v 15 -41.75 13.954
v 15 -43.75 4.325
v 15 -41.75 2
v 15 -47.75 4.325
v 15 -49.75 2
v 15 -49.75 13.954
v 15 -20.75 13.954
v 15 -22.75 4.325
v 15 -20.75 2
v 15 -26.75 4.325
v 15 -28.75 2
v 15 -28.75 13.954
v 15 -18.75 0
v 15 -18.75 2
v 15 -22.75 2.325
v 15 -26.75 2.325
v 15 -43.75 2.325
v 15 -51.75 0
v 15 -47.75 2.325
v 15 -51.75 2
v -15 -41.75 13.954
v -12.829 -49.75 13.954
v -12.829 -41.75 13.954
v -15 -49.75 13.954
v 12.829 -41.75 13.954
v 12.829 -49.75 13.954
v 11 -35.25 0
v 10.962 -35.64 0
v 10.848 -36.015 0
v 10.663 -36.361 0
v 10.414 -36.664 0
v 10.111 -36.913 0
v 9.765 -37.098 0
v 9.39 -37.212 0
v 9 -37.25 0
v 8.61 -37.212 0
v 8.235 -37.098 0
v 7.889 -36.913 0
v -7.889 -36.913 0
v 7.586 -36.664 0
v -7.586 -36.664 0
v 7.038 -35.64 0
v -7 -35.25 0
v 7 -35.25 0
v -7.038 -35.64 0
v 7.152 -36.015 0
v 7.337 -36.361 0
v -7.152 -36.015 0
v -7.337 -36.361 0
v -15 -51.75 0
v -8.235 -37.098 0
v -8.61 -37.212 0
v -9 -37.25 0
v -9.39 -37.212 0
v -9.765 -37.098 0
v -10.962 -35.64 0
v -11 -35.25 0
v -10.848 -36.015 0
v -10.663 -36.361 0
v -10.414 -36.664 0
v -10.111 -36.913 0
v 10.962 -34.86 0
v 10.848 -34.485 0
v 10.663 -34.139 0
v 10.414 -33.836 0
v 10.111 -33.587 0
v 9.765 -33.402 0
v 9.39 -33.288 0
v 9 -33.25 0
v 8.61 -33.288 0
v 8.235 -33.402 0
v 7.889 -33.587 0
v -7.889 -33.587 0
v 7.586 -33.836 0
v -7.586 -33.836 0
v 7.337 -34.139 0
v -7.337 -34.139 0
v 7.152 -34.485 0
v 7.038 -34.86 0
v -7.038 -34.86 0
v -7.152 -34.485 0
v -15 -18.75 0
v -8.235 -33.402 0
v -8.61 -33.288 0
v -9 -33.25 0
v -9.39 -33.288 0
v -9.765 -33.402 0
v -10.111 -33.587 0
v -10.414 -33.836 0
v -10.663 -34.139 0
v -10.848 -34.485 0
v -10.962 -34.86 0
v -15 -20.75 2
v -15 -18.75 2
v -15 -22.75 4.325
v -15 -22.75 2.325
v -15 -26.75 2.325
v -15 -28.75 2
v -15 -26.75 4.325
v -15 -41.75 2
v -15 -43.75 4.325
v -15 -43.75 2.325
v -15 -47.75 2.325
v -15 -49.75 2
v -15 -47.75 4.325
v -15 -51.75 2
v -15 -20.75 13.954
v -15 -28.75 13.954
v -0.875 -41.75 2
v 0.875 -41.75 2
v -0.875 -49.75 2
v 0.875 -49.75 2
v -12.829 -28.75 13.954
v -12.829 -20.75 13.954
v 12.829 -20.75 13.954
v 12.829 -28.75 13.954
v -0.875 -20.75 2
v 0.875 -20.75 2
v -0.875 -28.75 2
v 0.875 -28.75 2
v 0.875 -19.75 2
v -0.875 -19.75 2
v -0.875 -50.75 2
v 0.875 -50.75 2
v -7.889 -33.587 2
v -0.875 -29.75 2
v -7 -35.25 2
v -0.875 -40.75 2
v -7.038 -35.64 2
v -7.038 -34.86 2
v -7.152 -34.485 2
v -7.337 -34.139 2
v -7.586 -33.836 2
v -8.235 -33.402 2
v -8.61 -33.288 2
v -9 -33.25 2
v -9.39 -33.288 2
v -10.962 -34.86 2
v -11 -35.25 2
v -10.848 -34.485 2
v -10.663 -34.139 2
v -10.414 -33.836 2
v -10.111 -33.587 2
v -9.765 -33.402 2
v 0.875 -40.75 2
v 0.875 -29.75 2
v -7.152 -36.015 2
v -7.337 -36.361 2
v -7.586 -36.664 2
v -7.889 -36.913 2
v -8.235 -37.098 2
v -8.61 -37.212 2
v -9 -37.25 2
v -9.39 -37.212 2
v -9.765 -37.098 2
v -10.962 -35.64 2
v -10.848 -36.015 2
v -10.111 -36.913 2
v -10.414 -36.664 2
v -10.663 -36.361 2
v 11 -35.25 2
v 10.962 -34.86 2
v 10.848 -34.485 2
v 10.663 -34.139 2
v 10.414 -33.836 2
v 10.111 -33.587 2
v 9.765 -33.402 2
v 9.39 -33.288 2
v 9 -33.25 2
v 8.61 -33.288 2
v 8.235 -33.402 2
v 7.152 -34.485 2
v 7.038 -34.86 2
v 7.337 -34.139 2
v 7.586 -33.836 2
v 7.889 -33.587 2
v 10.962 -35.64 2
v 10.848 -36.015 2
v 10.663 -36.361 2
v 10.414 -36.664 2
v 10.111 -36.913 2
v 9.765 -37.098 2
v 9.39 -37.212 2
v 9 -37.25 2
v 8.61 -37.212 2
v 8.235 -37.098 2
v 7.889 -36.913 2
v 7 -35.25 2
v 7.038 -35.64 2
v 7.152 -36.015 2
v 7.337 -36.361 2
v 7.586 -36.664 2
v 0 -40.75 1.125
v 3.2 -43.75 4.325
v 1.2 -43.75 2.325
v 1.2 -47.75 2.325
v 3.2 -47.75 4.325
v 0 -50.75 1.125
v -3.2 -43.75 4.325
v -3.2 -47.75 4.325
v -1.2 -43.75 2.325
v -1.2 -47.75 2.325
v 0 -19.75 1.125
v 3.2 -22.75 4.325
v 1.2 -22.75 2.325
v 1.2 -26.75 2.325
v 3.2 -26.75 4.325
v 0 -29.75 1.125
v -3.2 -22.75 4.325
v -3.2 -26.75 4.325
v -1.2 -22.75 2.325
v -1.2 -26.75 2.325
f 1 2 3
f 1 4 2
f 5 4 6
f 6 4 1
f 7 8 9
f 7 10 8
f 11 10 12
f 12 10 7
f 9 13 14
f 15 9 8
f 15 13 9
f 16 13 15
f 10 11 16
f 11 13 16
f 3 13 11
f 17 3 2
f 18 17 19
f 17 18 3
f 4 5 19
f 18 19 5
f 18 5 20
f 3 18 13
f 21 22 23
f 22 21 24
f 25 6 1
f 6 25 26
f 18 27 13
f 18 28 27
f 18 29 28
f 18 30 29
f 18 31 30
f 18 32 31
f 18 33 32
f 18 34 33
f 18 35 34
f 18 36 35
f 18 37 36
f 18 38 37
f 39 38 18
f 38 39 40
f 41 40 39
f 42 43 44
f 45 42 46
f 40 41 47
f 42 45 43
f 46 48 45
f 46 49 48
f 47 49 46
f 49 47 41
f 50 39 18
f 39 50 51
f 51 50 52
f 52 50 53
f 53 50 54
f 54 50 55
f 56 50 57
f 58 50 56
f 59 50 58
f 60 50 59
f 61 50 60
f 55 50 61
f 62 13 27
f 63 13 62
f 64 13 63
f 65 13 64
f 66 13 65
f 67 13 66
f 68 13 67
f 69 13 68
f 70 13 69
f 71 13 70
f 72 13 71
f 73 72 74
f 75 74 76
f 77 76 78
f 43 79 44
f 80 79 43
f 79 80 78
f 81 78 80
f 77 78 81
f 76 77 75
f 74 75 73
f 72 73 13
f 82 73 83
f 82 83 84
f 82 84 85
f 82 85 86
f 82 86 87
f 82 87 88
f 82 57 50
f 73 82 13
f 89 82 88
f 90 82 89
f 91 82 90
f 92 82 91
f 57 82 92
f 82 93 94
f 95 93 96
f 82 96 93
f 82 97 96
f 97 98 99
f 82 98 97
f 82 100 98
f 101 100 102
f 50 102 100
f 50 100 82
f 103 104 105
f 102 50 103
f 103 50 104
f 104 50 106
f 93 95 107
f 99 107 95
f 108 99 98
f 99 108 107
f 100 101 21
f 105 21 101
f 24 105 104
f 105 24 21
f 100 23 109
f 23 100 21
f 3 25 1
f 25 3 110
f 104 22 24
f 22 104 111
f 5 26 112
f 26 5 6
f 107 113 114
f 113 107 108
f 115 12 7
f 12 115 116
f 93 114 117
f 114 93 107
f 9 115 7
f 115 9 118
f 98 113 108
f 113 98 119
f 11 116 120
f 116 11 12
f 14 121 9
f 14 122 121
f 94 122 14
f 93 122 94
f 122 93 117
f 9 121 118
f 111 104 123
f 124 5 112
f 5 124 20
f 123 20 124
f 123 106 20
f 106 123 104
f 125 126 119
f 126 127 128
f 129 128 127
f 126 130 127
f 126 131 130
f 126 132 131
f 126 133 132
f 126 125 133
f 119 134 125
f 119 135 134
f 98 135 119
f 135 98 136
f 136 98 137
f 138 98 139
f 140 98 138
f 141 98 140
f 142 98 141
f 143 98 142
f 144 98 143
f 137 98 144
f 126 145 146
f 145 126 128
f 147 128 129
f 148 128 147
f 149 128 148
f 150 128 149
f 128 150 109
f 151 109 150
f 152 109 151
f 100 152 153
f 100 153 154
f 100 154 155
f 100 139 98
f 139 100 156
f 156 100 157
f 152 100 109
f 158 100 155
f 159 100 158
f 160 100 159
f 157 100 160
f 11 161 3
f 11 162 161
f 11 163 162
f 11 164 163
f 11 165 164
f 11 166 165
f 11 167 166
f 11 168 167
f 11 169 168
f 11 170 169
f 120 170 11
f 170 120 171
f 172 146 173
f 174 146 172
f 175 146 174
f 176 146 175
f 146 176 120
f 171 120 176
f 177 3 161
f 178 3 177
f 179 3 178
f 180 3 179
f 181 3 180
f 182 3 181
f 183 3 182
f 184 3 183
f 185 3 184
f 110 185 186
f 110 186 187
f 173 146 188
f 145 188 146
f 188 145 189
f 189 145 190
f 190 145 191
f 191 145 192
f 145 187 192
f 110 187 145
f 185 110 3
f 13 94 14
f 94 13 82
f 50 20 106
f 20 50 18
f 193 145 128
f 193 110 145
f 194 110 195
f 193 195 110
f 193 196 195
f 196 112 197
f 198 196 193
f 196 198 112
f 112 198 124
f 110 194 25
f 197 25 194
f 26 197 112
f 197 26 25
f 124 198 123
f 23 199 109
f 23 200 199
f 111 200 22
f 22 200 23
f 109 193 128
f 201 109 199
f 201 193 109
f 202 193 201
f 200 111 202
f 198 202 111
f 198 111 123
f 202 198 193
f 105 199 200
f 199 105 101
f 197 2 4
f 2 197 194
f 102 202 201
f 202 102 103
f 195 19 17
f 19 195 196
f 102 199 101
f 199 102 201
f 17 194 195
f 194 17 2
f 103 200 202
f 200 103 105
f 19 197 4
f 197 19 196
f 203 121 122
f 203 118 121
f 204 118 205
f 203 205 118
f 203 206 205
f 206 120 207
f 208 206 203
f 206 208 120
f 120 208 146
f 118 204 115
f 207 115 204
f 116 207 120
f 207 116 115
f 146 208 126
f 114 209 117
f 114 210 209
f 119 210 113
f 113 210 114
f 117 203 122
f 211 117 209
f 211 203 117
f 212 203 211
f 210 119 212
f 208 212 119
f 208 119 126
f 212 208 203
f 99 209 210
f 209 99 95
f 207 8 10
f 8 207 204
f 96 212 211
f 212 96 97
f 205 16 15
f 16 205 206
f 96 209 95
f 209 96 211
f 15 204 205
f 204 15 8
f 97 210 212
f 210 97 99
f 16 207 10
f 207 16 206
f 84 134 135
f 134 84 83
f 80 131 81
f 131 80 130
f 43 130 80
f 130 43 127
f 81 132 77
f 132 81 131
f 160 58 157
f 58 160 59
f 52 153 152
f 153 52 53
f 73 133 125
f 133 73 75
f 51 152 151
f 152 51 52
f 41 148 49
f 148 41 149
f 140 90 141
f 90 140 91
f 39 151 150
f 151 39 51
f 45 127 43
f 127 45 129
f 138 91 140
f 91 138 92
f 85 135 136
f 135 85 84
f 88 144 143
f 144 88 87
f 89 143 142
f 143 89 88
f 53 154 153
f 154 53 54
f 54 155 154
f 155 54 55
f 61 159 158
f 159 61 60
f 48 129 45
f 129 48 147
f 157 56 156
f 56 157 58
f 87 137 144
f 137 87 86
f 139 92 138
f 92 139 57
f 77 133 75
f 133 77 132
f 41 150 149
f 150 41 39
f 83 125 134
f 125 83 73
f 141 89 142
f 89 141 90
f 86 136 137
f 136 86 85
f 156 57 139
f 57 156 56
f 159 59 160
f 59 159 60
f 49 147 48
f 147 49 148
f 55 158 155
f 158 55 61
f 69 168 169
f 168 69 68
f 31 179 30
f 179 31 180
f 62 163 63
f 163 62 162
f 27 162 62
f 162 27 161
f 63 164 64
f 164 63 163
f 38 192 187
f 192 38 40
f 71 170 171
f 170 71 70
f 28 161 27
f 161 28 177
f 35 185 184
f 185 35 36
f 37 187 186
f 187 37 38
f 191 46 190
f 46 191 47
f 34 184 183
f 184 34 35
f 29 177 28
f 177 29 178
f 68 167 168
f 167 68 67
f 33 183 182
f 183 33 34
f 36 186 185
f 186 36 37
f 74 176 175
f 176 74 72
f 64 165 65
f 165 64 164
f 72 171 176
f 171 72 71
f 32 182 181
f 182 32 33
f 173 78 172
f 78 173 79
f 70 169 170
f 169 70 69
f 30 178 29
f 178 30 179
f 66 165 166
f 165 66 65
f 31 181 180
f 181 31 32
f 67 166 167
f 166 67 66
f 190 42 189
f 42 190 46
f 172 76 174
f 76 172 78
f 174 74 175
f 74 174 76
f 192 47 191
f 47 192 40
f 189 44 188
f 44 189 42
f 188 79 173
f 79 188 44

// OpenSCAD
// =============================================================================
// Pumpe-vugge — holder Kamoer NKP-DC-S10B liggende i bay'en (ADR 012)
// =============================================================================
// Pumpen ligger med motoraksen langs y, hovedet (plast) mod Qi-spolen (+y)
// og slangerne ud foroven. Hovedet står på bay-gulvet; motoren ligger i to
// 90°-V-sadler og spændes fast med en kabelstrip om hver sadel. En V tager
// enhver motor-Ø fra ~20 til ~30mm — tallene i params.scad er skøn, så mål
// motorens Ø og aksens højde over hovedets bund før print.
//
// Vuggen sættes ned over to pinde på bay-gulvet (ingen huller i gulvet) og
// sikres med en dråbe lim eller tynd dobbeltklæbende tape.
//
// PRINT: PETG (eller TPU for mindre vibrationsstøj), bundpladen nedad.
// V-fladerne er 45° → ingen support. Strip-tunnelen er en 4mm bro.
// =============================================================================

include <params.scad>

r         = nkp_motor_d / 2;
v_clear   = 0.2;                                    // luft i V'en
apex_z    = nkp_axis_h - (r + v_clear) * sqrt(2);   // V'ens bund over gulvet
contact_z = nkp_axis_h - r / sqrt(2);               // hvor motoren rører V'en
block_h   = contact_z + 3;

module pump_cradle() {
    difference() {
        union() {
            translate([-cradle_w / 2, cradle_y0, 0])
                cube([cradle_w, cradle_y1 - cradle_y0, cradle_t]);
            for (sy = [cradle_s1, cradle_s2])
                translate([-cradle_w / 2, sy - 4, 0]) cube([cradle_w, 8, block_h]);
        }
        for (sy = [cradle_s1, cradle_s2]) {
            // 90°-V langs motoraksen
            translate([0, sy, 0]) rotate([90, 0, 0])
                linear_extrude(height = 10, center = true)
                    polygon([[0, apex_z], [-40, apex_z + 40], [40, apex_z + 40]]);
            // Strip-tunnel på tværs, under motoren
            translate([-cradle_w / 2 - 1, sy - tie_w / 2, max(apex_z, 0) + 1.2])
                cube([cradle_w + 2, tie_w, 2]);
        }
        // Huller til pindene på bay-gulvet
        for (px = [-9, 9])
            translate([px, cradle_pin_y, -1])
                cylinder(d = cradle_pin_d + 0.5, h = cradle_t + 2, $fn = 32);
    }
}

pump_cradle();
